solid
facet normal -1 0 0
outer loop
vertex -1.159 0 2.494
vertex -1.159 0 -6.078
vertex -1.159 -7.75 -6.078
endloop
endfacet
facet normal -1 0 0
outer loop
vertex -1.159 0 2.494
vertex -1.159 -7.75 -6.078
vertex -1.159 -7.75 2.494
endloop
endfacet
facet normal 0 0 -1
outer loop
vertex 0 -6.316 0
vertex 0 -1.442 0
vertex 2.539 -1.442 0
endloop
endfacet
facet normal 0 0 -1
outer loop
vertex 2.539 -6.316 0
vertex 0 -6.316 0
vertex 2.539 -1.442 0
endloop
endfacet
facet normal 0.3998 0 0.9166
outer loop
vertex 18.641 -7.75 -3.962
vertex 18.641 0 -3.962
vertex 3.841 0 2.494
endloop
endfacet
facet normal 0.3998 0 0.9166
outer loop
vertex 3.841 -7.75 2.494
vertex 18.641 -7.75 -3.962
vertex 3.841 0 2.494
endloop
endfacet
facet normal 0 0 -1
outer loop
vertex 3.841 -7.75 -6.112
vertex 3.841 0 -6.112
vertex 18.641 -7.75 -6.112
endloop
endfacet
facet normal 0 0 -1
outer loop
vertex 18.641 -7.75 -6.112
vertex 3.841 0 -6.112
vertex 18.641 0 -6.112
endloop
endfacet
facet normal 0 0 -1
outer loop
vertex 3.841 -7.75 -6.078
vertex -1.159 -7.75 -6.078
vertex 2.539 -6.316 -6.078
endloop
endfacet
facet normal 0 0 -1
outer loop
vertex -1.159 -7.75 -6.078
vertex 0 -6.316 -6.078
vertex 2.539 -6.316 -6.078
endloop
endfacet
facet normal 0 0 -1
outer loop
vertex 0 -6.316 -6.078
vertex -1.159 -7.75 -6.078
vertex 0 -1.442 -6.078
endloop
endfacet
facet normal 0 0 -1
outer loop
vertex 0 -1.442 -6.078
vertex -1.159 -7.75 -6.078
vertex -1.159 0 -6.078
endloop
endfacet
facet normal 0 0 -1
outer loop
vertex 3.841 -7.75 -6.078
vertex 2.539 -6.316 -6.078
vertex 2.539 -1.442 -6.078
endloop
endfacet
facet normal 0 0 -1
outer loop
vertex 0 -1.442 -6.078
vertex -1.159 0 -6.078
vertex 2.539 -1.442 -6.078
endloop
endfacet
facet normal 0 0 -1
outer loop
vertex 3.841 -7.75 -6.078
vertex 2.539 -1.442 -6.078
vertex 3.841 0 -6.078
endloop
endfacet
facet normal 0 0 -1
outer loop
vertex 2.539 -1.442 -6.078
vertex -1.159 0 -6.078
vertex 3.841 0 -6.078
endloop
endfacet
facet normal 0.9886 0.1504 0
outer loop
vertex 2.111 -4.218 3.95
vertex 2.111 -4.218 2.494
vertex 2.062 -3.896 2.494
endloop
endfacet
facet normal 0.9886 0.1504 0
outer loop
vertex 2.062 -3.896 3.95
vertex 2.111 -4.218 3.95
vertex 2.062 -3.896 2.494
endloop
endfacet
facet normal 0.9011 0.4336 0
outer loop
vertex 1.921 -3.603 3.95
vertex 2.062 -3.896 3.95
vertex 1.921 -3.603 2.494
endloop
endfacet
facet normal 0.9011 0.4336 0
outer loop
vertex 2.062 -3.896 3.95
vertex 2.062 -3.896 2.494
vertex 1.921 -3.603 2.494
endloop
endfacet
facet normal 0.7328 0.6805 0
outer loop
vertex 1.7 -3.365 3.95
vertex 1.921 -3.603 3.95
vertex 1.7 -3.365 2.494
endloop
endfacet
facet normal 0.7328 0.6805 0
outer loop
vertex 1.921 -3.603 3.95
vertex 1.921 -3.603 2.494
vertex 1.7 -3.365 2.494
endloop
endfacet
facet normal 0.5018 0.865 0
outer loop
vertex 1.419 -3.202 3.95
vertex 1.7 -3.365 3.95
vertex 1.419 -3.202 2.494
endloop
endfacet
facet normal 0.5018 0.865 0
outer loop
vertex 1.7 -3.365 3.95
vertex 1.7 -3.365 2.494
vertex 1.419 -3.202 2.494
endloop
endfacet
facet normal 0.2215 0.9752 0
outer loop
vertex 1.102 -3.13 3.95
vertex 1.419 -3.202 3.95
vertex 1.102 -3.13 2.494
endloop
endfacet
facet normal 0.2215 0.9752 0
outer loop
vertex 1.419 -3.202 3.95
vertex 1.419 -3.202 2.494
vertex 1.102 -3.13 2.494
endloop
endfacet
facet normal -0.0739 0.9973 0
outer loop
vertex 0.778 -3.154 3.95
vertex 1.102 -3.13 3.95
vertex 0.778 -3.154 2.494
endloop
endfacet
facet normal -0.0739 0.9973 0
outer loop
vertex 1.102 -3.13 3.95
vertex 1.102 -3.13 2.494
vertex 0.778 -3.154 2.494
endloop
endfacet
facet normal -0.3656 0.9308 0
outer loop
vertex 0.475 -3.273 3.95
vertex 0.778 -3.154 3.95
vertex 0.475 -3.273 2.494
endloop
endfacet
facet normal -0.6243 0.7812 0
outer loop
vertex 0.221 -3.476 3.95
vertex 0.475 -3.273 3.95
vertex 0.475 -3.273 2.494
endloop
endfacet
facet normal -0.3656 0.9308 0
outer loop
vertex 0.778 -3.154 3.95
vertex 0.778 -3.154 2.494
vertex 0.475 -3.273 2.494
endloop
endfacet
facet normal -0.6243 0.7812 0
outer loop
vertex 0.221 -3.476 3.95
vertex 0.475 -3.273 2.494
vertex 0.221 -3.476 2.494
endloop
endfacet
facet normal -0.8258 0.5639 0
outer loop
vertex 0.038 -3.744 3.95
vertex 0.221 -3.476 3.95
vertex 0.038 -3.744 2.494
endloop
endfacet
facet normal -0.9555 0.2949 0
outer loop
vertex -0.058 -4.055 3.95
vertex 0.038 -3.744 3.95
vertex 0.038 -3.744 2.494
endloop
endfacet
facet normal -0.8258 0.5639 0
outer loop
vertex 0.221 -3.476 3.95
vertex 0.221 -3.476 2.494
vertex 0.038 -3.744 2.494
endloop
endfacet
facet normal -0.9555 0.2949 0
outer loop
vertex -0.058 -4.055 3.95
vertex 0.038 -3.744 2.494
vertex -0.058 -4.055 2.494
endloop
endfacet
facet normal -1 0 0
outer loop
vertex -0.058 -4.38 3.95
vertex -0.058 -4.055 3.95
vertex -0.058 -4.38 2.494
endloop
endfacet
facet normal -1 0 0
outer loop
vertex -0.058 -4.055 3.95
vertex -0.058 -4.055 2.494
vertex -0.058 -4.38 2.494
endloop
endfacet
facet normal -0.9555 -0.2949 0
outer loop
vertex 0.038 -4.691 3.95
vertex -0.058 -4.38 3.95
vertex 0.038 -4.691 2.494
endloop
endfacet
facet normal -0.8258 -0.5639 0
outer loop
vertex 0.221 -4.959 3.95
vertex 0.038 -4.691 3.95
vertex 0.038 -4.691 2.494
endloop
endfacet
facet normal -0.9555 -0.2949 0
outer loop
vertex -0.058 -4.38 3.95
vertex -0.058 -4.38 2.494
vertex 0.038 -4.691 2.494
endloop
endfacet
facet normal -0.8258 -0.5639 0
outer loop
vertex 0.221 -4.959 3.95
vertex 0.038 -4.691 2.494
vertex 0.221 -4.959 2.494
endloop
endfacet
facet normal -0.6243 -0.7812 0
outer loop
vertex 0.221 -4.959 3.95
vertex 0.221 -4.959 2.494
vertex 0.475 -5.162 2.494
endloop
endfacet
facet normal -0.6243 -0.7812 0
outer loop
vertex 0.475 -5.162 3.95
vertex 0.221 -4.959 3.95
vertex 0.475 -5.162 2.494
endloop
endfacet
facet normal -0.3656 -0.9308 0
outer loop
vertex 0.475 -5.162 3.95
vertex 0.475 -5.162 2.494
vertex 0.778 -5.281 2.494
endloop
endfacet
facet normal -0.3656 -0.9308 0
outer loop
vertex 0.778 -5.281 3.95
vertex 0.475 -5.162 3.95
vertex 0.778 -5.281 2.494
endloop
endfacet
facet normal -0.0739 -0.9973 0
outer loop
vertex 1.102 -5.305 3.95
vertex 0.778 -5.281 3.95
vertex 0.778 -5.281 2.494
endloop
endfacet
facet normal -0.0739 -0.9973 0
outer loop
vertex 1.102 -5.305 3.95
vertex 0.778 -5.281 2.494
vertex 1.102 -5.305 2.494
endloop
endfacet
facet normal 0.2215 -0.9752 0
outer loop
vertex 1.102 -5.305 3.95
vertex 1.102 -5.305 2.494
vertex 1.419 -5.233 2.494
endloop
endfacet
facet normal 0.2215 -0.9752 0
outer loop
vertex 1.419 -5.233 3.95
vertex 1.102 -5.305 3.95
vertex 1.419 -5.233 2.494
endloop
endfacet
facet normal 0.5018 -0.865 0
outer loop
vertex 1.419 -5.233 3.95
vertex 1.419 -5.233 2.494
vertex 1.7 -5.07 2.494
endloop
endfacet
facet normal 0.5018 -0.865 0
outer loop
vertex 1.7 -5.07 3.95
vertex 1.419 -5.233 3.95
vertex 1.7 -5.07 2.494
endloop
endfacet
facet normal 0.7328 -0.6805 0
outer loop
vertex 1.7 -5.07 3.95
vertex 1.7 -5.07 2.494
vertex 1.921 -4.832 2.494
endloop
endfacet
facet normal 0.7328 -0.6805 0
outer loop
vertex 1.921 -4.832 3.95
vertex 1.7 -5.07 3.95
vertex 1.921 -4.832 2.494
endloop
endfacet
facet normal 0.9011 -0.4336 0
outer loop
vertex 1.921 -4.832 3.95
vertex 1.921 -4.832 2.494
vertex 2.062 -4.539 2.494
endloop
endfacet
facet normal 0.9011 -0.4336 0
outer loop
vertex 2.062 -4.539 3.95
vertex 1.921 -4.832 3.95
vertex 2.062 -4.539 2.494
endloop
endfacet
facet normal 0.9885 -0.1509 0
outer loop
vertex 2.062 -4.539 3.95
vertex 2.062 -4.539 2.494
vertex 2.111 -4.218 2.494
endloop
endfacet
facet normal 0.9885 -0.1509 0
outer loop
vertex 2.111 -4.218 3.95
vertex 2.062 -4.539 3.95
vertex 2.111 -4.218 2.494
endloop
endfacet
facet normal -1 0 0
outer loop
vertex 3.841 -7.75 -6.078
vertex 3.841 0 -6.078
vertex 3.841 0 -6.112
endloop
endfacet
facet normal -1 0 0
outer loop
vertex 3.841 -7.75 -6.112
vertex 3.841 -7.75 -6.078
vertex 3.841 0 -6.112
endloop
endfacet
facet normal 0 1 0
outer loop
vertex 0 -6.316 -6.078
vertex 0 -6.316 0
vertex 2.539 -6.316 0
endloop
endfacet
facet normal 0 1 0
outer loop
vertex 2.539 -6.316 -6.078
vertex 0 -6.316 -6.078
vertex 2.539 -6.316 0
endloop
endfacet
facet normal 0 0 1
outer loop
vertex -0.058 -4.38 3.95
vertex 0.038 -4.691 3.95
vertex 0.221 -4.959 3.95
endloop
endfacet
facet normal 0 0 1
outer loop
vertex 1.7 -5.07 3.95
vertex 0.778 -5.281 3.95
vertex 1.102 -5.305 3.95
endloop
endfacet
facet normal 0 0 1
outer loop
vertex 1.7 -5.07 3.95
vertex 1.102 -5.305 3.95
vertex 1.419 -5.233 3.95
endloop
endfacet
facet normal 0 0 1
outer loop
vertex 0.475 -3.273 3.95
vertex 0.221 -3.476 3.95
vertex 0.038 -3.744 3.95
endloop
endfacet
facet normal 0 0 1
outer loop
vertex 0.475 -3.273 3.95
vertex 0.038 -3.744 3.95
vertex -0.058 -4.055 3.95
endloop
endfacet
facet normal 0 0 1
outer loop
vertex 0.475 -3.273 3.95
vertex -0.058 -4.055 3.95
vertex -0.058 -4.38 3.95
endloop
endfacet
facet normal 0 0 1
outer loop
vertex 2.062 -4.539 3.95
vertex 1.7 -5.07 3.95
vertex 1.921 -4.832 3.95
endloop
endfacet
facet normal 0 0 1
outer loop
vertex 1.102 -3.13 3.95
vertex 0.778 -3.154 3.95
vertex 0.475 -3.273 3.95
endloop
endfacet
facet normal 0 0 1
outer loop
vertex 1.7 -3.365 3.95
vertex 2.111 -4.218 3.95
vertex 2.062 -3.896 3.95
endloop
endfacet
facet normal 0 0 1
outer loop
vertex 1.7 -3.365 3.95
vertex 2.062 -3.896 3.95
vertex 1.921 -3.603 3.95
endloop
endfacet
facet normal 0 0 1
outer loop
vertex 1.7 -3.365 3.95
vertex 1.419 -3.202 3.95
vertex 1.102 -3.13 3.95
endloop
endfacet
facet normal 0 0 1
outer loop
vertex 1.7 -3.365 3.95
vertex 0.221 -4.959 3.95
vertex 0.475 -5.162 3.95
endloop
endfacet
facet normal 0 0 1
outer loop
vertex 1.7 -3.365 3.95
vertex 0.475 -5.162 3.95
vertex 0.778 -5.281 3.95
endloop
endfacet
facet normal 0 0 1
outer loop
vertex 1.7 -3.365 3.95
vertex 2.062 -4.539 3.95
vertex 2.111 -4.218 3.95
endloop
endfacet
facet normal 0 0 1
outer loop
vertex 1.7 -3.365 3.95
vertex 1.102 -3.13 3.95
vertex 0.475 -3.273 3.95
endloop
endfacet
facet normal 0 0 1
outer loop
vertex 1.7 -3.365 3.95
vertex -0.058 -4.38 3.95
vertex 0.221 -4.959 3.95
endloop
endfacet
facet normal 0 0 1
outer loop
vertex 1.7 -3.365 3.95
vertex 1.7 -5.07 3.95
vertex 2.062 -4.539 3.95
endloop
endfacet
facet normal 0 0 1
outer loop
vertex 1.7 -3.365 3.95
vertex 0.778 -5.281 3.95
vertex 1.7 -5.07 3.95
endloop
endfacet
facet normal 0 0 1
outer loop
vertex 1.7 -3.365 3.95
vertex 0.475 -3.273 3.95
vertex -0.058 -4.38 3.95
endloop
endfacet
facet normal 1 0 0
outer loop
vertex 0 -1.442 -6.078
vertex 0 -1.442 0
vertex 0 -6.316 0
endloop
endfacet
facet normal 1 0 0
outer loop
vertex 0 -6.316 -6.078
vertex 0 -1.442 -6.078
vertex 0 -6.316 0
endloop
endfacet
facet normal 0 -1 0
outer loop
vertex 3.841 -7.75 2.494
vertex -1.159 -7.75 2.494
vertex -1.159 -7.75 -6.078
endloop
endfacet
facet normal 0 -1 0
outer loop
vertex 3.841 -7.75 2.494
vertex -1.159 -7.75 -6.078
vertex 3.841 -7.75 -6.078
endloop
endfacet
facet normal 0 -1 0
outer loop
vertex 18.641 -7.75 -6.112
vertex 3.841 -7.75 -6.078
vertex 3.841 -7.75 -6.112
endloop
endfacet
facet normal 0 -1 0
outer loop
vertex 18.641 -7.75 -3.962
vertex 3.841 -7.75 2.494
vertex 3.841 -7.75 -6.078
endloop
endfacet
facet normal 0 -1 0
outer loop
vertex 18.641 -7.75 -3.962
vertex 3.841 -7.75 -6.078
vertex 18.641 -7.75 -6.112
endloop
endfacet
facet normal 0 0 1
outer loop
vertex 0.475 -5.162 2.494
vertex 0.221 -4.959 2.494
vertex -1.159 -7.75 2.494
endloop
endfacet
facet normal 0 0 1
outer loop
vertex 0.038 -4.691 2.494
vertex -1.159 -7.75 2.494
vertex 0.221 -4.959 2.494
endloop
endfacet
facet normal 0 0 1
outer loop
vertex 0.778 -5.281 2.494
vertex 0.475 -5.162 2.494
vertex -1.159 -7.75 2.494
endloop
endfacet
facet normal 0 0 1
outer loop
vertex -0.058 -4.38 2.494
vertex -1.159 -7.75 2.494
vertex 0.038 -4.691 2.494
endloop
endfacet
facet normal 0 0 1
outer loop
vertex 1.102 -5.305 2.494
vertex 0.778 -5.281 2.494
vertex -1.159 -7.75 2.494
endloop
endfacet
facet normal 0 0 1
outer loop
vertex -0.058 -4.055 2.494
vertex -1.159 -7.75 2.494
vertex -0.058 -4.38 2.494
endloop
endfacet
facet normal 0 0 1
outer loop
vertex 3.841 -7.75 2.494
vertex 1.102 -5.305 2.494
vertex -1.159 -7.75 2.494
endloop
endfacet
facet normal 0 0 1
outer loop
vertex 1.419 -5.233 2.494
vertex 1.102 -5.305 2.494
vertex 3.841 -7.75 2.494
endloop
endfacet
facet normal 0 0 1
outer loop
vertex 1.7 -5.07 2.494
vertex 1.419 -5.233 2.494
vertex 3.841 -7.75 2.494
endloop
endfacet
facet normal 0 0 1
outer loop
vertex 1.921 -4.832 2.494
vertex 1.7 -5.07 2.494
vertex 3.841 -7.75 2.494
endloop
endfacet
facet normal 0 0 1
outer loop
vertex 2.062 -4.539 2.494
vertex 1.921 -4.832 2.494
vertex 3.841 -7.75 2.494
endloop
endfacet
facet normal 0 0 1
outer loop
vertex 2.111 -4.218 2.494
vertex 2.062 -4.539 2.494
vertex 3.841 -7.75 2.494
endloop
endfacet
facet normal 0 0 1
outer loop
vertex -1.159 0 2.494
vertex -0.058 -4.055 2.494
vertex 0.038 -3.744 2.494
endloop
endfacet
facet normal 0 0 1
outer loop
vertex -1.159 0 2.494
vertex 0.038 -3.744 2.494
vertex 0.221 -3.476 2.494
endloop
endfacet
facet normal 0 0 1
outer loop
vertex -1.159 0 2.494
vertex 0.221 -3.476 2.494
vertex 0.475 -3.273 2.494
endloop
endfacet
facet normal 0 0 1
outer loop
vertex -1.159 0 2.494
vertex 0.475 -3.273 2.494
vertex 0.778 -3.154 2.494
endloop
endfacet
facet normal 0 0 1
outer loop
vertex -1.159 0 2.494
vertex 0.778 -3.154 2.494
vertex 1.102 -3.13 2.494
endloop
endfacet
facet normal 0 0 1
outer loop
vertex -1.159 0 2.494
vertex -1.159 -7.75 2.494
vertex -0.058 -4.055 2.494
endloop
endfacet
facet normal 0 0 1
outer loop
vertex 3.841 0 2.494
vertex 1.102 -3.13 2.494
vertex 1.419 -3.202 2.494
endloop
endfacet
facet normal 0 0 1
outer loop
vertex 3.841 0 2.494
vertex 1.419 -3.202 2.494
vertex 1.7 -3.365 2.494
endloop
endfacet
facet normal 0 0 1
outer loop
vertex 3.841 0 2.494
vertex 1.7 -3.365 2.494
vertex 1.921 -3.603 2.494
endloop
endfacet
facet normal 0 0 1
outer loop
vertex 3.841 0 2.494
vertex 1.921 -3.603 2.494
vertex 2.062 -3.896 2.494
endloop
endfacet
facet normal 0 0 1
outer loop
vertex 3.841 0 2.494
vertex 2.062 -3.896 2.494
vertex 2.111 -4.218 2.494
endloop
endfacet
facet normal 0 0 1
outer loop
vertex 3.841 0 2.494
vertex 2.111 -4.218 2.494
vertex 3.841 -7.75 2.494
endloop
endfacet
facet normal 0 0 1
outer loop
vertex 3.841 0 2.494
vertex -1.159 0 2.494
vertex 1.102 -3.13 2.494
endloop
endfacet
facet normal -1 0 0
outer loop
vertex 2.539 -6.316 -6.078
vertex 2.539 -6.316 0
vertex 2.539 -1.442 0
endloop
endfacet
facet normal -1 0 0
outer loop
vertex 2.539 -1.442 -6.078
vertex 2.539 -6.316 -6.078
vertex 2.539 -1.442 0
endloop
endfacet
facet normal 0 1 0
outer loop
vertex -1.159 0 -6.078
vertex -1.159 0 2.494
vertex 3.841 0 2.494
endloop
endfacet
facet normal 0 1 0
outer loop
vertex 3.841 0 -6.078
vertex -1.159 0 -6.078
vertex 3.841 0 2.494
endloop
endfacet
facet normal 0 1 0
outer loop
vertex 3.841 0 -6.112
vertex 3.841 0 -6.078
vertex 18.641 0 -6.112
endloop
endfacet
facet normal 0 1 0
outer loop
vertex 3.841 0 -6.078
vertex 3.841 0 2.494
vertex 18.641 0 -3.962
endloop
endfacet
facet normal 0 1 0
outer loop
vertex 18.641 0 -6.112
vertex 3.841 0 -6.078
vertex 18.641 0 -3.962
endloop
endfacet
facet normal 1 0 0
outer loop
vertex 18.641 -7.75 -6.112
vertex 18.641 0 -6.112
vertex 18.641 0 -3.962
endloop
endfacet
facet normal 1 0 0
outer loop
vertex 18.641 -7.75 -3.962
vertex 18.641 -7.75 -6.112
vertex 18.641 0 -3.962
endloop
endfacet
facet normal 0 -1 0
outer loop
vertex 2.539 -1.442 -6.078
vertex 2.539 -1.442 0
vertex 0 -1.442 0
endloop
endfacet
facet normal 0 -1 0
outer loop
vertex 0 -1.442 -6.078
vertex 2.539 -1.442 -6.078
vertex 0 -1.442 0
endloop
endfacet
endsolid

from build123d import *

# Parameters (mm, degrees)
F0_W     = 5
F0_H     = 8.571429
F1_DEPTH = 7.75
F3_DEPTH = 3.95
F5_DEPTH = 25
F6_W     = 1.201827
F6_H     = 7.746514
F7_DEPTH = 6
F8_DEPTH = 6


with BuildPart() as f1:
    # F0 (on Front) → F1 (new body)
    with BuildSketch(Plane.XZ):
        with Locations((1.341188, -1.791949)):
            Rectangle(F0_W, F0_H)
        Polygon((18.641188, -3.961869), (3.841188, 2.493765), (3.841188, -6.077664), (3.841188, -6.111869), (18.641188, -6.111869), align=None)
    extrude(amount=F1_DEPTH)

    # F2 (on Top) → F3 (join)
    with BuildSketch(Plane.XY):
        with BuildLine():
            ThreePointArc((-0.070193, -4.217616), (1.020355, -5.308165), (2.110904, -4.217616))
            ThreePointArc((2.110904, -4.217616), (1.020355, -3.127068), (-0.070193, -4.217616))
        make_face()
    extrude(amount=F3_DEPTH)

    # F4 (on Top) → F5 (cut)
    with BuildSketch(Plane.XY):
        Polygon((0, -1.442116), (0, -6.315767), (2.538758, -6.315767), (2.538758, -1.442116), (1.405665, -1.442116), align=None)
    extrude(amount=-F5_DEPTH, mode=Mode.SUBTRACT)

    # F6 (on Top) → F7 (join)
    with BuildSketch(Plane.XY):
        with Locations((3.216505, -3.873257)):
            Rectangle(F6_W, F6_H)
    extrude(amount=-F7_DEPTH)

    # F6 (on Top) → F8 (join)
    with BuildSketch(Plane.XY):
        with Locations((3.216505, -3.873257)):
            Rectangle(F6_W, F6_H)
    extrude(amount=-F8_DEPTH)


solid = f1.part
